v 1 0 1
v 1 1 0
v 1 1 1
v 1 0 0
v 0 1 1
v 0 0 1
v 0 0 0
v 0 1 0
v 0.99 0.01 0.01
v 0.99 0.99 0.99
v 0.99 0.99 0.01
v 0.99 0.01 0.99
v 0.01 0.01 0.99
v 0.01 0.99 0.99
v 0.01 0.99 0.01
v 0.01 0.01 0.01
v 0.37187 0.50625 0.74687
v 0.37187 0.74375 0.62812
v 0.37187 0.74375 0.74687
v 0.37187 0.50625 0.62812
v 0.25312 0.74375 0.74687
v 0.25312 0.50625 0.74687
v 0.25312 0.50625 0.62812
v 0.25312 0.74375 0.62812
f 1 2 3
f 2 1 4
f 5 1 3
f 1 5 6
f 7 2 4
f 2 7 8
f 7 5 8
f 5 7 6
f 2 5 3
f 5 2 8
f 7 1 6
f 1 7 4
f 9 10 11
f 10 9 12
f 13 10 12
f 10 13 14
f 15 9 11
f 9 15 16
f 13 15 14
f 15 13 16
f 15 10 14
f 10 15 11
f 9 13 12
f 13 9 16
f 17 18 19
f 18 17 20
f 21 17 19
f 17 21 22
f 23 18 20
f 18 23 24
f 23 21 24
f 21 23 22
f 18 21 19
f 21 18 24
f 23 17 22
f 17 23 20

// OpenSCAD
translate([0.3125, 0.625, 0.6875]) color([0.044872440589686424, 0.20282732922717495, 0.47778002198978586]) cube([0.11875, 0.2375, 0.11875], center=true);
color([0.3,0.3,0.3,0.3]) difference() { cube([1,1,1]); translate([0.01,0.01,0.01]) cube([0.98,0.98,0.98]); }
